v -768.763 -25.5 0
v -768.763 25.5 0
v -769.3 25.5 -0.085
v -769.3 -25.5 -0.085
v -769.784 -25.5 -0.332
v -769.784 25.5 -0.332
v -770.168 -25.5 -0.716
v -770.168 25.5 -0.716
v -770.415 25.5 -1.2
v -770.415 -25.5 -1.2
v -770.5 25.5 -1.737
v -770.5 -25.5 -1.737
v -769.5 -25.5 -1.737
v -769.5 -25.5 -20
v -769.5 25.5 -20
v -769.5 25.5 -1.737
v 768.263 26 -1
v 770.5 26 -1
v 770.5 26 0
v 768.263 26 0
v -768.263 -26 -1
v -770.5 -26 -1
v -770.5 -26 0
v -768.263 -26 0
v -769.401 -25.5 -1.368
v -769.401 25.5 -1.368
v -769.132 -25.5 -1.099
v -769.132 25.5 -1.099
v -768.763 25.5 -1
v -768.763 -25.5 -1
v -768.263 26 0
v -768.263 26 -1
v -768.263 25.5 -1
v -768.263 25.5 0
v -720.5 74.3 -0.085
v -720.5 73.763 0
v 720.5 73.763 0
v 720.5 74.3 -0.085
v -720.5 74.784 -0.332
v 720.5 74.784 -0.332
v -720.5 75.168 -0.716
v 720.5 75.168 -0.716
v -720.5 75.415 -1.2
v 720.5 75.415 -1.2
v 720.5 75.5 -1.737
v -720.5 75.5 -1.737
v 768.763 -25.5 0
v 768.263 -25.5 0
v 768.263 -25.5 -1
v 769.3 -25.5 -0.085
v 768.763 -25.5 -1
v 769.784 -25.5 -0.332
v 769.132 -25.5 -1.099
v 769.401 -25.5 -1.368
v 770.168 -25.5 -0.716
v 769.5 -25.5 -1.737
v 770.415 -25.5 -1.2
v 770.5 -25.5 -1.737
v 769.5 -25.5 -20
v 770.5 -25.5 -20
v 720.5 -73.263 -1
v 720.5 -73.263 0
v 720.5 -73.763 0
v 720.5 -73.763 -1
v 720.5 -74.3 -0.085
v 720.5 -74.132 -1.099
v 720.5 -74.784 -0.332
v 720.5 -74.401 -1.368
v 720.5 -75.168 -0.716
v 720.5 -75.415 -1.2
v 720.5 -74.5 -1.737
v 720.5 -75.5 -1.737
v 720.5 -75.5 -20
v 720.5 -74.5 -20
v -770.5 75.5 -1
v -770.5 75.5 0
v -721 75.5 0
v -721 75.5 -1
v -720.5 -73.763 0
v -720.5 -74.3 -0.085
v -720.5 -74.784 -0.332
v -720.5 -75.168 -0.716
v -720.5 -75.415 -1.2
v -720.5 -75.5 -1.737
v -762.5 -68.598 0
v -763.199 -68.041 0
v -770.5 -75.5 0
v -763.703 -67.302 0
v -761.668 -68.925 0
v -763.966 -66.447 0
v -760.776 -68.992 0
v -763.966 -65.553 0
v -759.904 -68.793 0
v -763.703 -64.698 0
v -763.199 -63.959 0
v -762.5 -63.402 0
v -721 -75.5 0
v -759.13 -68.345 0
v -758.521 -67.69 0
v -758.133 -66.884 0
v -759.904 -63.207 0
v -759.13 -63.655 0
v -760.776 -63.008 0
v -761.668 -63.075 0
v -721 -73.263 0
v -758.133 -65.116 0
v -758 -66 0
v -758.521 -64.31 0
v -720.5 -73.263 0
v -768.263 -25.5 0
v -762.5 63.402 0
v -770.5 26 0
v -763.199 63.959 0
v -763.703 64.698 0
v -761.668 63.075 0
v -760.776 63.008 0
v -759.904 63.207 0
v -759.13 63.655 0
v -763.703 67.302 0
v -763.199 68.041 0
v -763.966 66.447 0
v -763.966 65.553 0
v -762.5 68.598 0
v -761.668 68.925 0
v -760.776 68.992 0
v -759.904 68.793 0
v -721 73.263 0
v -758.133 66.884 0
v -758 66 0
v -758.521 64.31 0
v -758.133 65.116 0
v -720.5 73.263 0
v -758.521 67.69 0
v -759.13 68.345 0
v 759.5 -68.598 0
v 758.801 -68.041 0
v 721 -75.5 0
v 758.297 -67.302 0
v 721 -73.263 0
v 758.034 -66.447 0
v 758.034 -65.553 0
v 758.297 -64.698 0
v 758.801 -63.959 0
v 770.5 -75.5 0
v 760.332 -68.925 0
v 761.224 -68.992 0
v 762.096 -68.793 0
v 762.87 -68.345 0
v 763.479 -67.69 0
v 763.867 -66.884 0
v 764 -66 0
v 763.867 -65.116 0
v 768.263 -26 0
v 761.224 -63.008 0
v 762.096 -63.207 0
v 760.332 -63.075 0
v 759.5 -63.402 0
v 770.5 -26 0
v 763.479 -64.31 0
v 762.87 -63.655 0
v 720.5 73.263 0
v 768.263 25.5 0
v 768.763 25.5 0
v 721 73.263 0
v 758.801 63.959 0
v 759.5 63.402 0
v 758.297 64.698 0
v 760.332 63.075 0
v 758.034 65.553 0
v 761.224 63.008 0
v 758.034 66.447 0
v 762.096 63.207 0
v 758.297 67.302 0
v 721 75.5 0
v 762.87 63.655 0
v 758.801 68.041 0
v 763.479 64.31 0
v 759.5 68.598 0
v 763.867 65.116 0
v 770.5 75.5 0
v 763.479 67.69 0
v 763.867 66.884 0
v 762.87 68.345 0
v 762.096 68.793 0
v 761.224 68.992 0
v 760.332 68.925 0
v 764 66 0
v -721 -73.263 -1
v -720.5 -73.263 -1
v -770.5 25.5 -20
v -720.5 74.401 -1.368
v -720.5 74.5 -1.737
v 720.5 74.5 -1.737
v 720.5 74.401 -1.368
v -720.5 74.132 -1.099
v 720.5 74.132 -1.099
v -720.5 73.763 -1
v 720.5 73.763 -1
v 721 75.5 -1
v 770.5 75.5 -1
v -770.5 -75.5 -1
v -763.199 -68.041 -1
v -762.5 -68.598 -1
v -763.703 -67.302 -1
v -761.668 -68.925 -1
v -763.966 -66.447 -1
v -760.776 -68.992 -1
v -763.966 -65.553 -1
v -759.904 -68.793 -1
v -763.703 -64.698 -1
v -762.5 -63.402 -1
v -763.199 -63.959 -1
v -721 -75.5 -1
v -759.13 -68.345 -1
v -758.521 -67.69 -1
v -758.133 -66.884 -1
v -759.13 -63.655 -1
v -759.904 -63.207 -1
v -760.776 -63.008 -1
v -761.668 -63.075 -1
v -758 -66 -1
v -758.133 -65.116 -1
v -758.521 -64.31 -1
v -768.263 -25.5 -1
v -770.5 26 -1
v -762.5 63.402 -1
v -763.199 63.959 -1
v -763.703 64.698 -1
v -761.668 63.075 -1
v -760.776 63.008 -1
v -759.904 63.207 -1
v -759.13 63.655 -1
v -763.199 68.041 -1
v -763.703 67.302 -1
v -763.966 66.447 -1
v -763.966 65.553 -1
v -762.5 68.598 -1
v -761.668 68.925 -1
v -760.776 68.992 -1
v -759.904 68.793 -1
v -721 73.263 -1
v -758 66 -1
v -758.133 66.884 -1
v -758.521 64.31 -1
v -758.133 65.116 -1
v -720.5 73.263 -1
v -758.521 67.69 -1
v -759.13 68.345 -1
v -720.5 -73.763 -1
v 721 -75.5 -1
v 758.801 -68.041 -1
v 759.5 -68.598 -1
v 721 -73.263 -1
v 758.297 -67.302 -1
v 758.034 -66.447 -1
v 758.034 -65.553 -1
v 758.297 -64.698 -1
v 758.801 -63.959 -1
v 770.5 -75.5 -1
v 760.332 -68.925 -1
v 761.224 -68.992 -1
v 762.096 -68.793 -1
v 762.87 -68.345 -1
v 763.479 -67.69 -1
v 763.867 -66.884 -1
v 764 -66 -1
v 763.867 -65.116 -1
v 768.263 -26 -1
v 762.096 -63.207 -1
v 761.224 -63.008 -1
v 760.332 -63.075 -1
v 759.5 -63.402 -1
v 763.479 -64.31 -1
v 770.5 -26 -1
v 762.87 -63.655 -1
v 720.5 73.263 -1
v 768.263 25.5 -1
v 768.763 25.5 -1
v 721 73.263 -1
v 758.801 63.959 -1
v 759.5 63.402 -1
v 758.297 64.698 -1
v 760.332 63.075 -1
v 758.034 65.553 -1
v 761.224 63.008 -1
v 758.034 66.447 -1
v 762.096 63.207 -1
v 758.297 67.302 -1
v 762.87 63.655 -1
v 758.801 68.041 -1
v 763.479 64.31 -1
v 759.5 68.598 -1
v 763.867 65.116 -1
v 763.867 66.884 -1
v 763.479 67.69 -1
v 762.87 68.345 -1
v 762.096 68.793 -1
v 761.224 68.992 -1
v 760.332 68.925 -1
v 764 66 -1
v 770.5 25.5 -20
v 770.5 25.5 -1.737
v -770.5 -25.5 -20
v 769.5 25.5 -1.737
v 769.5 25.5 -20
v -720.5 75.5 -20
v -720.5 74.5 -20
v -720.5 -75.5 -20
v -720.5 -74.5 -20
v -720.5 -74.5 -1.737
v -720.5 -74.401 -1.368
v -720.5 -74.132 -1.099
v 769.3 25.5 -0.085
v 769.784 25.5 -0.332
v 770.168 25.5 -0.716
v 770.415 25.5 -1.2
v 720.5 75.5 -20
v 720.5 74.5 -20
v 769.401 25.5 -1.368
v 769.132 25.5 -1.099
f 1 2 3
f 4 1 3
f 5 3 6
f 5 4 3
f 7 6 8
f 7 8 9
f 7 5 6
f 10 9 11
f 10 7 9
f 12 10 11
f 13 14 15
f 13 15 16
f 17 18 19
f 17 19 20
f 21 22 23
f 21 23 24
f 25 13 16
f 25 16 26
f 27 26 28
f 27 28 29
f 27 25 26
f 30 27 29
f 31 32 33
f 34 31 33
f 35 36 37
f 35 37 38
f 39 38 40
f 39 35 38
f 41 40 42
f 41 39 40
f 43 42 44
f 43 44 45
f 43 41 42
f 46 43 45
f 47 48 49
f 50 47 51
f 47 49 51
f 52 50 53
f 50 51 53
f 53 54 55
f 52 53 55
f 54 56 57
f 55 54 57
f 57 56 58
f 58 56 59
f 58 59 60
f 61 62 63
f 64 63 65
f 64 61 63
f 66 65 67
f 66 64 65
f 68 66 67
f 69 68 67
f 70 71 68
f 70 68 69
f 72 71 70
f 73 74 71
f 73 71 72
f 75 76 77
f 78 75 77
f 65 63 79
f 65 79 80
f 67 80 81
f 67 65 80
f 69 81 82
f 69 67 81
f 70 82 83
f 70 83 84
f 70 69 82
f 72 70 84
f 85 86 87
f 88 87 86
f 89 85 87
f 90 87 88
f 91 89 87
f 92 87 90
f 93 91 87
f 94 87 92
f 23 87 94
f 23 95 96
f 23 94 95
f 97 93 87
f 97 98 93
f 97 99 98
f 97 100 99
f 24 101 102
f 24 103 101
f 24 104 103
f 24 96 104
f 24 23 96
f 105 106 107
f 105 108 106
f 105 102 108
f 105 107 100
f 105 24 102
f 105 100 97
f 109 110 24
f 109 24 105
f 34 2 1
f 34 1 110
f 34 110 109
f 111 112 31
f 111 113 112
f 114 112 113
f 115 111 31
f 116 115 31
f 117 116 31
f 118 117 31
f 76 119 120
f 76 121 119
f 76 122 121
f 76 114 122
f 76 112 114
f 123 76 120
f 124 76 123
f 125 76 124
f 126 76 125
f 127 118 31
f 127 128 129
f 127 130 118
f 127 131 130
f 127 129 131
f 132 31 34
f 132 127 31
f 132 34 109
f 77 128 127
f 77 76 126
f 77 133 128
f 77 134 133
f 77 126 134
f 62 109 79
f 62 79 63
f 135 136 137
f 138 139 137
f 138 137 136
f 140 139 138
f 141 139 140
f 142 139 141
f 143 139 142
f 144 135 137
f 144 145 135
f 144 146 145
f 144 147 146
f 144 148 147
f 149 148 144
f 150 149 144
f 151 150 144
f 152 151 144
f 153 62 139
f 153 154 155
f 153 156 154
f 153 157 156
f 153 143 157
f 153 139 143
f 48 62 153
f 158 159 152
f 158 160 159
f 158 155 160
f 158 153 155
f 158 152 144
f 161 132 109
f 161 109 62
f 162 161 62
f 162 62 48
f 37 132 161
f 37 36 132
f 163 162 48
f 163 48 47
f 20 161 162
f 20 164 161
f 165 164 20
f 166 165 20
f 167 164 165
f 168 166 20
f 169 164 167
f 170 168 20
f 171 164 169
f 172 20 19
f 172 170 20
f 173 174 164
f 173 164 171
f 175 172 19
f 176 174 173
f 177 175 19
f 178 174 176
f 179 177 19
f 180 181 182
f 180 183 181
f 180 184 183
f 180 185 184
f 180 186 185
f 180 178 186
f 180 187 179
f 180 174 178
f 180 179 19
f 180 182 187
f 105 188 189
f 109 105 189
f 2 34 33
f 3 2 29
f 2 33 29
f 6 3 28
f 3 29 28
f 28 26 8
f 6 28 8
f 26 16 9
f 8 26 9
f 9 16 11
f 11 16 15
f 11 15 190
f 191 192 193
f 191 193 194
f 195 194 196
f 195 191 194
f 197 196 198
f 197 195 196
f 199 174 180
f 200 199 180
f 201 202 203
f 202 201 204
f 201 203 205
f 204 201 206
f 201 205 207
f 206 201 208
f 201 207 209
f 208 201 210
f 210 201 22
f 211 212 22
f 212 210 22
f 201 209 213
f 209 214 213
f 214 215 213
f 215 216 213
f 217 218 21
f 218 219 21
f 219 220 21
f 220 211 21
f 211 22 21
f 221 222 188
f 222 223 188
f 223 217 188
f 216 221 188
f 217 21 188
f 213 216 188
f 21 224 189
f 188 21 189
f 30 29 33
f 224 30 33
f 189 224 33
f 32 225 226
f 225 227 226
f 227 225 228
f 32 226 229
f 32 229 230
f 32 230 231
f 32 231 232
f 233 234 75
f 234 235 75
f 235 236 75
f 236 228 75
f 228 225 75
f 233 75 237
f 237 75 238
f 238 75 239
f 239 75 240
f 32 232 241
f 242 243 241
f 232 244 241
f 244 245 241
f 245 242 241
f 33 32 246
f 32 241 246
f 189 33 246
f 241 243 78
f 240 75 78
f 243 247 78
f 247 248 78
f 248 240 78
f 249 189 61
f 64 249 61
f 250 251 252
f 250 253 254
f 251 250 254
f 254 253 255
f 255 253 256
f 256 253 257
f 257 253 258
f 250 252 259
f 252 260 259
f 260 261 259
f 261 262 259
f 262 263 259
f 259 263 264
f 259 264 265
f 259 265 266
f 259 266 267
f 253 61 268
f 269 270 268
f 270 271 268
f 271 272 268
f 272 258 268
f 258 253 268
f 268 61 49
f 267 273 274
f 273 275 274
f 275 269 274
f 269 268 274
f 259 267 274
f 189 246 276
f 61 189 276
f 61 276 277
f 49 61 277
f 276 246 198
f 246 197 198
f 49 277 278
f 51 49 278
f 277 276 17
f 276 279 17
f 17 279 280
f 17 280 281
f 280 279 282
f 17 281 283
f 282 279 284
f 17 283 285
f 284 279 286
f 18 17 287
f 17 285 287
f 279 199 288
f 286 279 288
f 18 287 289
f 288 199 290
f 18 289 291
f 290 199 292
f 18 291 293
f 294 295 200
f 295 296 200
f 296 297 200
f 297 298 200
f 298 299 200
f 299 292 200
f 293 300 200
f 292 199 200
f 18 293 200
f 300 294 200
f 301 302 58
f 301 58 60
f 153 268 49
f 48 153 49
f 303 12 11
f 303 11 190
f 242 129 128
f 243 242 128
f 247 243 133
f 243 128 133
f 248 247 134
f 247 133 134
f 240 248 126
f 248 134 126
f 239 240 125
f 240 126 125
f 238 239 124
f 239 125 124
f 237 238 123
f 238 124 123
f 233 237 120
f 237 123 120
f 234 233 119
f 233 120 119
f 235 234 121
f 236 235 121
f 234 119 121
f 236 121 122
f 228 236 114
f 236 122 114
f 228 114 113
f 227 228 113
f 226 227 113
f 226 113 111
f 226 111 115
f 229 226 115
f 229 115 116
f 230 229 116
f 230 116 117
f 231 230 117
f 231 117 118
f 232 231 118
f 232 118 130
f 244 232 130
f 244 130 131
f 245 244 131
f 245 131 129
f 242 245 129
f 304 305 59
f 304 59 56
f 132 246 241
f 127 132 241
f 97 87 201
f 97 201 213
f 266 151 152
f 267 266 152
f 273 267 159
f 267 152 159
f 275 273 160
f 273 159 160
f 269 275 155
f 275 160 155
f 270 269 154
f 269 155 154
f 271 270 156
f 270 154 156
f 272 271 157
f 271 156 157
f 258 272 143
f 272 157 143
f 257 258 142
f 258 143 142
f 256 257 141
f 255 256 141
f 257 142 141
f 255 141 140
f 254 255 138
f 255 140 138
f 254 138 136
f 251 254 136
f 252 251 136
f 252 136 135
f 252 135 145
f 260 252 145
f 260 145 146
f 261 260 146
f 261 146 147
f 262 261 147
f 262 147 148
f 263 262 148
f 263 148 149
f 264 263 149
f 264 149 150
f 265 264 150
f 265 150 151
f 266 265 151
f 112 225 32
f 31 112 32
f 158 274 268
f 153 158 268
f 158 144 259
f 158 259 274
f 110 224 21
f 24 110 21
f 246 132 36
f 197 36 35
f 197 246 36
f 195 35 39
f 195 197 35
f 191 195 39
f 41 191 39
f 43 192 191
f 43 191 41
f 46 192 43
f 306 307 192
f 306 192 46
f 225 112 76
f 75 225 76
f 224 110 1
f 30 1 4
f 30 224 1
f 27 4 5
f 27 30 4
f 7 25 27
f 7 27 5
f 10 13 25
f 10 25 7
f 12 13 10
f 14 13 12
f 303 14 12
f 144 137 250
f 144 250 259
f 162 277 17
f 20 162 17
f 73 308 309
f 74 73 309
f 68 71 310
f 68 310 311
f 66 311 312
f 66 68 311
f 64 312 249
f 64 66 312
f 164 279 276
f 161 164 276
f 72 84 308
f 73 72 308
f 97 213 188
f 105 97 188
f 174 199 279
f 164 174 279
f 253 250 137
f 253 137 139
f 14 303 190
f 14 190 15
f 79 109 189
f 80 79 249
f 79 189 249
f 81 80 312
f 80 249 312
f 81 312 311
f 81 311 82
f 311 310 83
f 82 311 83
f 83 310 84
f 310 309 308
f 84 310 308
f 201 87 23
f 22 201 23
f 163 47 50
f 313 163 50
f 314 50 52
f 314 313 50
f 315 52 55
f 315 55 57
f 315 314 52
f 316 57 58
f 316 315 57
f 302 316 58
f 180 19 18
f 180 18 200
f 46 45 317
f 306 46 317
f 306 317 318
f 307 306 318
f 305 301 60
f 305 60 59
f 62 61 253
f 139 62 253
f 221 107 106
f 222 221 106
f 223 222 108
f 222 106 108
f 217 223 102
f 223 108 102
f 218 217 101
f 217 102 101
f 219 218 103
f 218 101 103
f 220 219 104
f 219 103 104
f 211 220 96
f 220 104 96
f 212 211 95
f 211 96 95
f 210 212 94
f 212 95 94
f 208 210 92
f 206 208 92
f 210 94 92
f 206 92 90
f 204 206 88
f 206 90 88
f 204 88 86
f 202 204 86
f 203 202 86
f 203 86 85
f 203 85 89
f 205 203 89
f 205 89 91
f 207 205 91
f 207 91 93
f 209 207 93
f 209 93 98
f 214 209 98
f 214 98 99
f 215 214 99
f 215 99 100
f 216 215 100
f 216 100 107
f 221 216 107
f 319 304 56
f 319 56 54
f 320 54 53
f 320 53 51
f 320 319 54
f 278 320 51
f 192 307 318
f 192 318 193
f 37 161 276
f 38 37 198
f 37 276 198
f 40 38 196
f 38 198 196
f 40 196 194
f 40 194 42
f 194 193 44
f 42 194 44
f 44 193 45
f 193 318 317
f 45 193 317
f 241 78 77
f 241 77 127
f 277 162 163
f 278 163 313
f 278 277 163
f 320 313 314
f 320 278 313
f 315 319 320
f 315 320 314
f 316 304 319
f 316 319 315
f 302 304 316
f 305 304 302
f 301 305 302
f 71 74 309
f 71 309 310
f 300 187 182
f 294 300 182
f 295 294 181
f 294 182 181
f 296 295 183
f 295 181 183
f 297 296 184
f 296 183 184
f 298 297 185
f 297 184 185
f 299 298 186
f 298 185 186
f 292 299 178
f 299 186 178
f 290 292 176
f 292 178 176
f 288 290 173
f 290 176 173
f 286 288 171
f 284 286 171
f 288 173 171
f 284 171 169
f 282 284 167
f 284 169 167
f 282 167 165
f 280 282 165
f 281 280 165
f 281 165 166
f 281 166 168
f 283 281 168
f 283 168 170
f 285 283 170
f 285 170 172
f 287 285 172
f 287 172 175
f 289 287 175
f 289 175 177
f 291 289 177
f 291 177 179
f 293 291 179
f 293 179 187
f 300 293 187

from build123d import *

# Parameters (mm, degrees)
SKETCH_1_W                        = 1541
SKETCH_1_H                        = 151
SM_BASE_FLANGE_1_DEPTH            = 1
SM_EDGE_FLANGE_1_STRIP_W          = 5.4732
SM_EDGE_FLANGE_1_STRIP_H          = 1
SM_EDGE_FLANGE_1_STRIP_CUT_DEPTH  = 1441
SM_EDGE_FLANGE_1_RELIEF_W         = 5.9732
SM_EDGE_FLANGE_1_RELIEF_H         = 0.5
SM_EDGE_FLANGE_1_RELIEF_CUT_DEPTH = 1
SM_EDGE_FLANGE_1_DEPTH            = 1441
SM_EDGE_FLANGE_2_STRIP_W          = 5.4732
SM_EDGE_FLANGE_2_STRIP_H          = 1
SM_EDGE_FLANGE_2_STRIP_CUT_DEPTH  = 1441
SM_EDGE_FLANGE_2_RELIEF_W         = 5.9732
SM_EDGE_FLANGE_2_RELIEF_H         = 0.5
SM_EDGE_FLANGE_2_RELIEF_CUT_DEPTH = 1
SM_EDGE_FLANGE_2_DEPTH            = 1441
SM_EDGE_FLANGE_3_STRIP_W          = 5.4732
SM_EDGE_FLANGE_3_STRIP_H          = 1
SM_EDGE_FLANGE_3_STRIP_CUT_DEPTH  = 51
SM_EDGE_FLANGE_3_RELIEF_W         = 5.9732
SM_EDGE_FLANGE_3_RELIEF_H         = 0.5
SM_EDGE_FLANGE_3_RELIEF_CUT_DEPTH = 1
SM_EDGE_FLANGE_3_DEPTH            = 51
SM_EDGE_FLANGE_4_STRIP_W          = 5.4732
SM_EDGE_FLANGE_4_STRIP_H          = 1
SM_EDGE_FLANGE_4_STRIP_CUT_DEPTH  = 51
SM_EDGE_FLANGE_4_RELIEF_W         = 5.9732
SM_EDGE_FLANGE_4_RELIEF_H         = 0.5
SM_EDGE_FLANGE_4_RELIEF_CUT_DEPTH = 1
SM_EDGE_FLANGE_4_DEPTH            = 51
SKETCH_15_R                       = 3
CUT_EXTRUDE_1_DEPTH               = 775.44851346


# Sheet-metal steps are written as plain solids
with BuildPart() as part:
    # Sketch 1 → 基体-法兰1 (new body)
    with BuildSketch(Plane.XY):
        Rectangle(SKETCH_1_W, SKETCH_1_H)
    extrude(amount=-SM_BASE_FLANGE_1_DEPTH)

    # 边线-法兰1 strip (across the edge) → 边线-法兰1 strip cut (cut)
    with BuildSketch(Plane(origin=(-720.5, 75.5, -1), x_dir=(0, -1, 0), z_dir=(1, 0, 0))):
        with Locations((-1, -0.5)):
            Rectangle(SM_EDGE_FLANGE_1_STRIP_W, SM_EDGE_FLANGE_1_STRIP_H)
    extrude(amount=SM_EDGE_FLANGE_1_STRIP_CUT_DEPTH, mode=Mode.SUBTRACT)

    # 边线-法兰1 relief (on the sheet) → 边线-法兰1 relief cut (cut)
    with BuildSketch(Plane(origin=(-720.5, 73.7634, -1), x_dir=(0, -1, 0), z_dir=(0, 0, -1))):
        with Locations((-2.4866, 0.25)):
            Rectangle(SM_EDGE_FLANGE_1_RELIEF_W, SM_EDGE_FLANGE_1_RELIEF_H)
        with Locations((-2.4866, -1441.25)):
            Rectangle(SM_EDGE_FLANGE_1_RELIEF_W, SM_EDGE_FLANGE_1_RELIEF_H)
    extrude(amount=-SM_EDGE_FLANGE_1_RELIEF_CUT_DEPTH, mode=Mode.SUBTRACT)

    # 边线-法兰1 section (across the edge) → 边线-法兰1 (add)
    with BuildSketch(Plane(origin=(-720.5, 75.5, -1), x_dir=(0, -1, 0), z_dir=(1, 0, 0))):
        with BuildLine():
            Line((0, 0.7366), (0, 19))
            Line((0, 19), (1, 19))
            Line((1, 19), (1, 0.7366))
            ThreePointArc((1, 0.7366), (1.215745145, 0.215745145), (1.7366, 0))
            Line((1.7366, 0), (1.7366, -1))
            ThreePointArc((1.7366, -1), (0.508638364, -0.491361636), (0, 0.7366))
        make_face()
    extrude(amount=SM_EDGE_FLANGE_1_DEPTH)

    # 边线-法兰2 strip (across the edge) → 边线-法兰2 strip cut (cut)
    with BuildSketch(Plane(origin=(720.5, -75.5, -1), x_dir=(0, 1, 0), z_dir=(-1, 0, 0))):
        with Locations((-1, -0.5)):
            Rectangle(SM_EDGE_FLANGE_2_STRIP_W, SM_EDGE_FLANGE_2_STRIP_H)
    extrude(amount=SM_EDGE_FLANGE_2_STRIP_CUT_DEPTH, mode=Mode.SUBTRACT)

    # 边线-法兰2 relief (on the sheet) → 边线-法兰2 relief cut (cut)
    with BuildSketch(Plane(origin=(720.5, -73.7634, -1), x_dir=(0, 1, 0), z_dir=(0, 0, -1))):
        with Locations((-2.4866, 0.25)):
            Rectangle(SM_EDGE_FLANGE_2_RELIEF_W, SM_EDGE_FLANGE_2_RELIEF_H)
        with Locations((-2.4866, -1441.25)):
            Rectangle(SM_EDGE_FLANGE_2_RELIEF_W, SM_EDGE_FLANGE_2_RELIEF_H)
    extrude(amount=-SM_EDGE_FLANGE_2_RELIEF_CUT_DEPTH, mode=Mode.SUBTRACT)

    # 边线-法兰2 section (across the edge) → 边线-法兰2 (add)
    with BuildSketch(Plane(origin=(720.5, -75.5, -1), x_dir=(0, 1, 0), z_dir=(-1, 0, 0))):
        with BuildLine():
            Line((0, 0.7366), (0, 19))
            Line((0, 19), (1, 19))
            Line((1, 19), (1, 0.7366))
            ThreePointArc((1, 0.7366), (1.215745145, 0.215745145), (1.7366, 0))
            Line((1.7366, 0), (1.7366, -1))
            ThreePointArc((1.7366, -1), (0.508638364, -0.491361636), (0, 0.7366))
        make_face()
    extrude(amount=SM_EDGE_FLANGE_2_DEPTH)

    # 边线-法兰3 strip (across the edge) → 边线-法兰3 strip cut (cut)
    with BuildSketch(Plane(origin=(770.5, 25.5, -1), x_dir=(-1, 0, 0), z_dir=(0, -1, 0))):
        with Locations((-1, -0.5)):
            Rectangle(SM_EDGE_FLANGE_3_STRIP_W, SM_EDGE_FLANGE_3_STRIP_H)
    extrude(amount=SM_EDGE_FLANGE_3_STRIP_CUT_DEPTH, mode=Mode.SUBTRACT)

    # 边线-法兰3 relief (on the sheet) → 边线-法兰3 relief cut (cut)
    with BuildSketch(Plane(origin=(768.7634, 25.5, -1), x_dir=(-1, 0, 0), z_dir=(0, 0, -1))):
        with Locations((-2.4866, 0.25)):
            Rectangle(SM_EDGE_FLANGE_3_RELIEF_W, SM_EDGE_FLANGE_3_RELIEF_H)
        with Locations((-2.4866, -51.25)):
            Rectangle(SM_EDGE_FLANGE_3_RELIEF_W, SM_EDGE_FLANGE_3_RELIEF_H)
    extrude(amount=-SM_EDGE_FLANGE_3_RELIEF_CUT_DEPTH, mode=Mode.SUBTRACT)

    # 边线-法兰3 section (across the edge) → 边线-法兰3 (add)
    with BuildSketch(Plane(origin=(770.5, 25.5, -1), x_dir=(-1, 0, 0), z_dir=(0, -1, 0))):
        with BuildLine():
            Line((0, 0.7366), (0, 19))
            Line((0, 19), (1, 19))
            Line((1, 19), (1, 0.7366))
            ThreePointArc((1, 0.7366), (1.215745145, 0.215745145), (1.7366, 0))
            Line((1.7366, 0), (1.7366, -1))
            ThreePointArc((1.7366, -1), (0.508638364, -0.491361636), (0, 0.7366))
        make_face()
    extrude(amount=SM_EDGE_FLANGE_3_DEPTH)

    # 边线-法兰4 strip (across the edge) → 边线-法兰4 strip cut (cut)
    with BuildSketch(Plane(origin=(-770.5, -25.5, -1), x_dir=(1, 0, 0), z_dir=(0, 1, 0))):
        with Locations((-1, -0.5)):
            Rectangle(SM_EDGE_FLANGE_4_STRIP_W, SM_EDGE_FLANGE_4_STRIP_H)
    extrude(amount=SM_EDGE_FLANGE_4_STRIP_CUT_DEPTH, mode=Mode.SUBTRACT)

    # 边线-法兰4 relief (on the sheet) → 边线-法兰4 relief cut (cut)
    with BuildSketch(Plane(origin=(-768.7634, -25.5, -1), x_dir=(1, 0, 0), z_dir=(0, 0, -1))):
        with Locations((-2.4866, 0.25)):
            Rectangle(SM_EDGE_FLANGE_4_RELIEF_W, SM_EDGE_FLANGE_4_RELIEF_H)
        with Locations((-2.4866, -51.25)):
            Rectangle(SM_EDGE_FLANGE_4_RELIEF_W, SM_EDGE_FLANGE_4_RELIEF_H)
    extrude(amount=-SM_EDGE_FLANGE_4_RELIEF_CUT_DEPTH, mode=Mode.SUBTRACT)

    # 边线-法兰4 section (across the edge) → 边线-法兰4 (add)
    with BuildSketch(Plane(origin=(-770.5, -25.5, -1), x_dir=(1, 0, 0), z_dir=(0, 1, 0))):
        with BuildLine():
            Line((0, 0.7366), (0, 19))
            Line((0, 19), (1, 19))
            Line((1, 19), (1, 0.7366))
            ThreePointArc((1, 0.7366), (1.215745145, 0.215745145), (1.7366, 0))
            Line((1.7366, 0), (1.7366, -1))
            ThreePointArc((1.7366, -1), (0.508638364, -0.491361636), (0, 0.7366))
        make_face()
    extrude(amount=SM_EDGE_FLANGE_4_DEPTH)

    # 草图15 → 切除-拉伸1 (cut, through all)
    with BuildSketch(Plane.XY):
        with Locations((761, 66)):
            Circle(SKETCH_15_R)
        with Locations((761, -66)):
            Circle(SKETCH_15_R)
        with Locations((-761, 66)):
            Circle(SKETCH_15_R)
        with Locations((-761, -66)):
            Circle(SKETCH_15_R)
    extrude(amount=-CUT_EXTRUDE_1_DEPTH, mode=Mode.SUBTRACT)


solid = part.part
